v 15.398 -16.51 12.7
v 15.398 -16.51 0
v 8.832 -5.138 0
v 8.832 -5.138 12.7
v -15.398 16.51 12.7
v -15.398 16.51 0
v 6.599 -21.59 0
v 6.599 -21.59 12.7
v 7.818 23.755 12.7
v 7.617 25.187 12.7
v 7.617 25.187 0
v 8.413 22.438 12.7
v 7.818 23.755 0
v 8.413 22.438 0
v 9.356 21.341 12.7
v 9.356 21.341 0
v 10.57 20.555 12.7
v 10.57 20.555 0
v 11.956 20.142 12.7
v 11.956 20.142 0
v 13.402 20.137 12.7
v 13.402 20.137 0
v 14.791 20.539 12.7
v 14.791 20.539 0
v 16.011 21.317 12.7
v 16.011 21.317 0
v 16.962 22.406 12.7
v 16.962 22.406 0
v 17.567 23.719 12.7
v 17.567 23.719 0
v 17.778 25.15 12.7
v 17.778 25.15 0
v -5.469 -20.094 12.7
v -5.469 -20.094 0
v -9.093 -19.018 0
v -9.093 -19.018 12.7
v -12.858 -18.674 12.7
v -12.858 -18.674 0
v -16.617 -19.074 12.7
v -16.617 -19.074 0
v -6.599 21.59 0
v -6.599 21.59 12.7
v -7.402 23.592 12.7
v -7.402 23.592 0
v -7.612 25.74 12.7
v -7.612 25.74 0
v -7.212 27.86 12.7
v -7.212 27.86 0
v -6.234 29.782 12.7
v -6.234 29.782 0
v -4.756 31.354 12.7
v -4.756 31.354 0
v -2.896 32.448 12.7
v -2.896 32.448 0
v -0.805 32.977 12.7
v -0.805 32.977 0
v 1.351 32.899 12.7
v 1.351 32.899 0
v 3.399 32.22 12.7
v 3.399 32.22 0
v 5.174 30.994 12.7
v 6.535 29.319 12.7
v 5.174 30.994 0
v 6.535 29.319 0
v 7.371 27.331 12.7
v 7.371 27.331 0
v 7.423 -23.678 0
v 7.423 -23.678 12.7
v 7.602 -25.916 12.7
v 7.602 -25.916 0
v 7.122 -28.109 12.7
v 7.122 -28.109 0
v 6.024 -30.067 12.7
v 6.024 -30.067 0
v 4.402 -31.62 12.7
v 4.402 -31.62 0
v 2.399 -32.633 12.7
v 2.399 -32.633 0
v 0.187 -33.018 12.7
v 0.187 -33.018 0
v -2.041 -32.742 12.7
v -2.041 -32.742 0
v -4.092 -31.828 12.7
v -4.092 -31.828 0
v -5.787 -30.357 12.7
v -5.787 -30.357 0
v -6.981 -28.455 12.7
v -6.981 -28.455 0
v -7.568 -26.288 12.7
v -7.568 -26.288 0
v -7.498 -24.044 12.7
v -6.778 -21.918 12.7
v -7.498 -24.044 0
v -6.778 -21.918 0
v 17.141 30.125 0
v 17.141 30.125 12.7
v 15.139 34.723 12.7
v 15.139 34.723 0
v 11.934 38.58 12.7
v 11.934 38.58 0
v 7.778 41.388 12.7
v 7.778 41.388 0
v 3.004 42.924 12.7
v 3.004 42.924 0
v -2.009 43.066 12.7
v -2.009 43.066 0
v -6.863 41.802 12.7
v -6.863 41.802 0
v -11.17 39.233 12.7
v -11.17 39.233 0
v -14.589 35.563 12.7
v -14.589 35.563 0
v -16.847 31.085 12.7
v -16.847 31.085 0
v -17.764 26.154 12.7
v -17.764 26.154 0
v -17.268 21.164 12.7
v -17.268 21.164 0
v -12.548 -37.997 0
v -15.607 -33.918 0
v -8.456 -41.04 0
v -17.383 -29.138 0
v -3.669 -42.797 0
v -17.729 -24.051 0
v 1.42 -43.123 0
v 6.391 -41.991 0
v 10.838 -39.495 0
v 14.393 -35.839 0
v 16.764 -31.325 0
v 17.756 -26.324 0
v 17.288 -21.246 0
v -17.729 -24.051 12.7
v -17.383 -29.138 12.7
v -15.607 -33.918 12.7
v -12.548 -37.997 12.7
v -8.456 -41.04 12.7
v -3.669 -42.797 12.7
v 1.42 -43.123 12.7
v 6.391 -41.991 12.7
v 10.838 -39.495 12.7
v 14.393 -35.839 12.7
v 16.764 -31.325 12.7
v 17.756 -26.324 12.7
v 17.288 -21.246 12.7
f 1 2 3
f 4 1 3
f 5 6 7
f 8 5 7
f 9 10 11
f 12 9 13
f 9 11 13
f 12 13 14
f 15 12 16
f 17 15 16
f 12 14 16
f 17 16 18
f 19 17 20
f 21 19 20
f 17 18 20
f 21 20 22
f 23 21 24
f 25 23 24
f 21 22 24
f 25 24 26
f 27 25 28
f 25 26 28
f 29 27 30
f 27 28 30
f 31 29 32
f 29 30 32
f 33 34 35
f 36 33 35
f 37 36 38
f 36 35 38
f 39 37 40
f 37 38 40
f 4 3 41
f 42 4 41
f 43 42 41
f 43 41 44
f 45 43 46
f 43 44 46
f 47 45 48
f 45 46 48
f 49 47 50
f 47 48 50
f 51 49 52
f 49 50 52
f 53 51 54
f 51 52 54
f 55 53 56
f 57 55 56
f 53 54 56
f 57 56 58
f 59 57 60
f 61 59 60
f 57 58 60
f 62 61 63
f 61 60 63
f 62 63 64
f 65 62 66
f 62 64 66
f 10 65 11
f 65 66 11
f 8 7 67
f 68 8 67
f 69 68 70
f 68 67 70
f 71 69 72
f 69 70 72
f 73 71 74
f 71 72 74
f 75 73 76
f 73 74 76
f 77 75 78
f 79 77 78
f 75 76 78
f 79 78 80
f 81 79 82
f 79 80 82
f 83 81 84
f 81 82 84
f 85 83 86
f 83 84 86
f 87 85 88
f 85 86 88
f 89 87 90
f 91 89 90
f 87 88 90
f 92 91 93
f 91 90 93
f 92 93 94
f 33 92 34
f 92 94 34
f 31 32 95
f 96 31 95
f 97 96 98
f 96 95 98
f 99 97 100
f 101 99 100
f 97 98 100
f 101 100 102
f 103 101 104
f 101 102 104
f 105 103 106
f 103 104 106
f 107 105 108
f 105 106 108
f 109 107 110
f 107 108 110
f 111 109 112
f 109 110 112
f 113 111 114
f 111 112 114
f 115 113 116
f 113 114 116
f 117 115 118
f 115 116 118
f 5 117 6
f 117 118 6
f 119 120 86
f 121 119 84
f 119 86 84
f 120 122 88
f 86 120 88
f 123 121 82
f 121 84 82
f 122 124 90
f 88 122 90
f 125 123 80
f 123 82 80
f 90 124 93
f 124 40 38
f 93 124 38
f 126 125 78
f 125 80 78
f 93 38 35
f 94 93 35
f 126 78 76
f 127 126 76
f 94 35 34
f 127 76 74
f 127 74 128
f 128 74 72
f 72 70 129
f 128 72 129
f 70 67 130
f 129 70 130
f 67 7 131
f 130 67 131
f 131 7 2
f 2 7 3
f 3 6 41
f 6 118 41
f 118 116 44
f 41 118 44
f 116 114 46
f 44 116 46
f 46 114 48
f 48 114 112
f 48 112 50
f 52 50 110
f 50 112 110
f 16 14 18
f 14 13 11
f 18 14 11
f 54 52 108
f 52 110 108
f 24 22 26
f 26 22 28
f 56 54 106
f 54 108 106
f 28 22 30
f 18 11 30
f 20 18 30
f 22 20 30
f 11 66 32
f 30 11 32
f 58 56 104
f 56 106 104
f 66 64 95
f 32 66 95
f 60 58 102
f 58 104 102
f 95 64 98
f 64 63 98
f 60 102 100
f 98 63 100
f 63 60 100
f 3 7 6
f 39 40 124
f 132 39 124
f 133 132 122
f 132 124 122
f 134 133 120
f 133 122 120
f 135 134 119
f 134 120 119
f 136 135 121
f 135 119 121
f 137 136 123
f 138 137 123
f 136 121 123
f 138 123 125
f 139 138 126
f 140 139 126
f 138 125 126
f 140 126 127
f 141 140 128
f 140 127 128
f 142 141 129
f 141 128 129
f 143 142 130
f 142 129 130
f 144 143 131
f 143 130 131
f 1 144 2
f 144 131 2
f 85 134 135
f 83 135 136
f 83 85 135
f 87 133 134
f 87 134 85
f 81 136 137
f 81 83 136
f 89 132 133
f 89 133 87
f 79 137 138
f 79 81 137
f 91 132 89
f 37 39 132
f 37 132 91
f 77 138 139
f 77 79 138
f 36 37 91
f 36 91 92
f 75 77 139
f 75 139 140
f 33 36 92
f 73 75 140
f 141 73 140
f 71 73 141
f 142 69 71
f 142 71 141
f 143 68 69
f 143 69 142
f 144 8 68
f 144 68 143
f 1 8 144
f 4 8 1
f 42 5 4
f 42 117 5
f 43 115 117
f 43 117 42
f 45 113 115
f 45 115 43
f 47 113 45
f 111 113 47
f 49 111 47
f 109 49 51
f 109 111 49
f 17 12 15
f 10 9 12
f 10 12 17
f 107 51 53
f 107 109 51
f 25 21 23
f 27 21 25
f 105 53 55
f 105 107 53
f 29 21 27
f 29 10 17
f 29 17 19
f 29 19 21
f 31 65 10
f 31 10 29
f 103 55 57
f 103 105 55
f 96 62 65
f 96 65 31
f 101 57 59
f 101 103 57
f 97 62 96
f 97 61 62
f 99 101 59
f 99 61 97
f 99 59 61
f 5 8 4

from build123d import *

# Parameters (mm, degrees)
F1_DEPTH = 12.7


with BuildPart() as f1:
    # F0 (on Top) → F1 (new body)
    with BuildSketch(Plane.XY):
        with BuildLine():
            ThreePointArc((17.778243, 25.150034), (-4.480962, 42.606086), (-15.397932, 16.51))
            Line((-15.397932, 16.51), (6.599114, -21.59))
            ThreePointArc((6.599114, -21.59), (-0.93735, -32.962128), (-5.469168, -20.094098))
            ThreePointArc((-5.469168, -20.094098), (-10.966834, -18.752892), (-16.616611, -19.074129))
            ThreePointArc((-16.616611, -19.074129), (1.419501, -43.123245), (15.397932, -16.51))
            Line((15.397932, -16.51), (8.832116, -5.137674))
            Line((8.832116, -5.137674), (-6.599114, 21.59))
            ThreePointArc((-6.599114, 21.59), (-1.869298, 32.787159), (7.617032, 25.187352))
            ThreePointArc((7.617032, 25.187352), (12.678979, 20.088088), (17.778243, 25.150034))
        make_face()
    extrude(amount=F1_DEPTH)


solid = f1.part
